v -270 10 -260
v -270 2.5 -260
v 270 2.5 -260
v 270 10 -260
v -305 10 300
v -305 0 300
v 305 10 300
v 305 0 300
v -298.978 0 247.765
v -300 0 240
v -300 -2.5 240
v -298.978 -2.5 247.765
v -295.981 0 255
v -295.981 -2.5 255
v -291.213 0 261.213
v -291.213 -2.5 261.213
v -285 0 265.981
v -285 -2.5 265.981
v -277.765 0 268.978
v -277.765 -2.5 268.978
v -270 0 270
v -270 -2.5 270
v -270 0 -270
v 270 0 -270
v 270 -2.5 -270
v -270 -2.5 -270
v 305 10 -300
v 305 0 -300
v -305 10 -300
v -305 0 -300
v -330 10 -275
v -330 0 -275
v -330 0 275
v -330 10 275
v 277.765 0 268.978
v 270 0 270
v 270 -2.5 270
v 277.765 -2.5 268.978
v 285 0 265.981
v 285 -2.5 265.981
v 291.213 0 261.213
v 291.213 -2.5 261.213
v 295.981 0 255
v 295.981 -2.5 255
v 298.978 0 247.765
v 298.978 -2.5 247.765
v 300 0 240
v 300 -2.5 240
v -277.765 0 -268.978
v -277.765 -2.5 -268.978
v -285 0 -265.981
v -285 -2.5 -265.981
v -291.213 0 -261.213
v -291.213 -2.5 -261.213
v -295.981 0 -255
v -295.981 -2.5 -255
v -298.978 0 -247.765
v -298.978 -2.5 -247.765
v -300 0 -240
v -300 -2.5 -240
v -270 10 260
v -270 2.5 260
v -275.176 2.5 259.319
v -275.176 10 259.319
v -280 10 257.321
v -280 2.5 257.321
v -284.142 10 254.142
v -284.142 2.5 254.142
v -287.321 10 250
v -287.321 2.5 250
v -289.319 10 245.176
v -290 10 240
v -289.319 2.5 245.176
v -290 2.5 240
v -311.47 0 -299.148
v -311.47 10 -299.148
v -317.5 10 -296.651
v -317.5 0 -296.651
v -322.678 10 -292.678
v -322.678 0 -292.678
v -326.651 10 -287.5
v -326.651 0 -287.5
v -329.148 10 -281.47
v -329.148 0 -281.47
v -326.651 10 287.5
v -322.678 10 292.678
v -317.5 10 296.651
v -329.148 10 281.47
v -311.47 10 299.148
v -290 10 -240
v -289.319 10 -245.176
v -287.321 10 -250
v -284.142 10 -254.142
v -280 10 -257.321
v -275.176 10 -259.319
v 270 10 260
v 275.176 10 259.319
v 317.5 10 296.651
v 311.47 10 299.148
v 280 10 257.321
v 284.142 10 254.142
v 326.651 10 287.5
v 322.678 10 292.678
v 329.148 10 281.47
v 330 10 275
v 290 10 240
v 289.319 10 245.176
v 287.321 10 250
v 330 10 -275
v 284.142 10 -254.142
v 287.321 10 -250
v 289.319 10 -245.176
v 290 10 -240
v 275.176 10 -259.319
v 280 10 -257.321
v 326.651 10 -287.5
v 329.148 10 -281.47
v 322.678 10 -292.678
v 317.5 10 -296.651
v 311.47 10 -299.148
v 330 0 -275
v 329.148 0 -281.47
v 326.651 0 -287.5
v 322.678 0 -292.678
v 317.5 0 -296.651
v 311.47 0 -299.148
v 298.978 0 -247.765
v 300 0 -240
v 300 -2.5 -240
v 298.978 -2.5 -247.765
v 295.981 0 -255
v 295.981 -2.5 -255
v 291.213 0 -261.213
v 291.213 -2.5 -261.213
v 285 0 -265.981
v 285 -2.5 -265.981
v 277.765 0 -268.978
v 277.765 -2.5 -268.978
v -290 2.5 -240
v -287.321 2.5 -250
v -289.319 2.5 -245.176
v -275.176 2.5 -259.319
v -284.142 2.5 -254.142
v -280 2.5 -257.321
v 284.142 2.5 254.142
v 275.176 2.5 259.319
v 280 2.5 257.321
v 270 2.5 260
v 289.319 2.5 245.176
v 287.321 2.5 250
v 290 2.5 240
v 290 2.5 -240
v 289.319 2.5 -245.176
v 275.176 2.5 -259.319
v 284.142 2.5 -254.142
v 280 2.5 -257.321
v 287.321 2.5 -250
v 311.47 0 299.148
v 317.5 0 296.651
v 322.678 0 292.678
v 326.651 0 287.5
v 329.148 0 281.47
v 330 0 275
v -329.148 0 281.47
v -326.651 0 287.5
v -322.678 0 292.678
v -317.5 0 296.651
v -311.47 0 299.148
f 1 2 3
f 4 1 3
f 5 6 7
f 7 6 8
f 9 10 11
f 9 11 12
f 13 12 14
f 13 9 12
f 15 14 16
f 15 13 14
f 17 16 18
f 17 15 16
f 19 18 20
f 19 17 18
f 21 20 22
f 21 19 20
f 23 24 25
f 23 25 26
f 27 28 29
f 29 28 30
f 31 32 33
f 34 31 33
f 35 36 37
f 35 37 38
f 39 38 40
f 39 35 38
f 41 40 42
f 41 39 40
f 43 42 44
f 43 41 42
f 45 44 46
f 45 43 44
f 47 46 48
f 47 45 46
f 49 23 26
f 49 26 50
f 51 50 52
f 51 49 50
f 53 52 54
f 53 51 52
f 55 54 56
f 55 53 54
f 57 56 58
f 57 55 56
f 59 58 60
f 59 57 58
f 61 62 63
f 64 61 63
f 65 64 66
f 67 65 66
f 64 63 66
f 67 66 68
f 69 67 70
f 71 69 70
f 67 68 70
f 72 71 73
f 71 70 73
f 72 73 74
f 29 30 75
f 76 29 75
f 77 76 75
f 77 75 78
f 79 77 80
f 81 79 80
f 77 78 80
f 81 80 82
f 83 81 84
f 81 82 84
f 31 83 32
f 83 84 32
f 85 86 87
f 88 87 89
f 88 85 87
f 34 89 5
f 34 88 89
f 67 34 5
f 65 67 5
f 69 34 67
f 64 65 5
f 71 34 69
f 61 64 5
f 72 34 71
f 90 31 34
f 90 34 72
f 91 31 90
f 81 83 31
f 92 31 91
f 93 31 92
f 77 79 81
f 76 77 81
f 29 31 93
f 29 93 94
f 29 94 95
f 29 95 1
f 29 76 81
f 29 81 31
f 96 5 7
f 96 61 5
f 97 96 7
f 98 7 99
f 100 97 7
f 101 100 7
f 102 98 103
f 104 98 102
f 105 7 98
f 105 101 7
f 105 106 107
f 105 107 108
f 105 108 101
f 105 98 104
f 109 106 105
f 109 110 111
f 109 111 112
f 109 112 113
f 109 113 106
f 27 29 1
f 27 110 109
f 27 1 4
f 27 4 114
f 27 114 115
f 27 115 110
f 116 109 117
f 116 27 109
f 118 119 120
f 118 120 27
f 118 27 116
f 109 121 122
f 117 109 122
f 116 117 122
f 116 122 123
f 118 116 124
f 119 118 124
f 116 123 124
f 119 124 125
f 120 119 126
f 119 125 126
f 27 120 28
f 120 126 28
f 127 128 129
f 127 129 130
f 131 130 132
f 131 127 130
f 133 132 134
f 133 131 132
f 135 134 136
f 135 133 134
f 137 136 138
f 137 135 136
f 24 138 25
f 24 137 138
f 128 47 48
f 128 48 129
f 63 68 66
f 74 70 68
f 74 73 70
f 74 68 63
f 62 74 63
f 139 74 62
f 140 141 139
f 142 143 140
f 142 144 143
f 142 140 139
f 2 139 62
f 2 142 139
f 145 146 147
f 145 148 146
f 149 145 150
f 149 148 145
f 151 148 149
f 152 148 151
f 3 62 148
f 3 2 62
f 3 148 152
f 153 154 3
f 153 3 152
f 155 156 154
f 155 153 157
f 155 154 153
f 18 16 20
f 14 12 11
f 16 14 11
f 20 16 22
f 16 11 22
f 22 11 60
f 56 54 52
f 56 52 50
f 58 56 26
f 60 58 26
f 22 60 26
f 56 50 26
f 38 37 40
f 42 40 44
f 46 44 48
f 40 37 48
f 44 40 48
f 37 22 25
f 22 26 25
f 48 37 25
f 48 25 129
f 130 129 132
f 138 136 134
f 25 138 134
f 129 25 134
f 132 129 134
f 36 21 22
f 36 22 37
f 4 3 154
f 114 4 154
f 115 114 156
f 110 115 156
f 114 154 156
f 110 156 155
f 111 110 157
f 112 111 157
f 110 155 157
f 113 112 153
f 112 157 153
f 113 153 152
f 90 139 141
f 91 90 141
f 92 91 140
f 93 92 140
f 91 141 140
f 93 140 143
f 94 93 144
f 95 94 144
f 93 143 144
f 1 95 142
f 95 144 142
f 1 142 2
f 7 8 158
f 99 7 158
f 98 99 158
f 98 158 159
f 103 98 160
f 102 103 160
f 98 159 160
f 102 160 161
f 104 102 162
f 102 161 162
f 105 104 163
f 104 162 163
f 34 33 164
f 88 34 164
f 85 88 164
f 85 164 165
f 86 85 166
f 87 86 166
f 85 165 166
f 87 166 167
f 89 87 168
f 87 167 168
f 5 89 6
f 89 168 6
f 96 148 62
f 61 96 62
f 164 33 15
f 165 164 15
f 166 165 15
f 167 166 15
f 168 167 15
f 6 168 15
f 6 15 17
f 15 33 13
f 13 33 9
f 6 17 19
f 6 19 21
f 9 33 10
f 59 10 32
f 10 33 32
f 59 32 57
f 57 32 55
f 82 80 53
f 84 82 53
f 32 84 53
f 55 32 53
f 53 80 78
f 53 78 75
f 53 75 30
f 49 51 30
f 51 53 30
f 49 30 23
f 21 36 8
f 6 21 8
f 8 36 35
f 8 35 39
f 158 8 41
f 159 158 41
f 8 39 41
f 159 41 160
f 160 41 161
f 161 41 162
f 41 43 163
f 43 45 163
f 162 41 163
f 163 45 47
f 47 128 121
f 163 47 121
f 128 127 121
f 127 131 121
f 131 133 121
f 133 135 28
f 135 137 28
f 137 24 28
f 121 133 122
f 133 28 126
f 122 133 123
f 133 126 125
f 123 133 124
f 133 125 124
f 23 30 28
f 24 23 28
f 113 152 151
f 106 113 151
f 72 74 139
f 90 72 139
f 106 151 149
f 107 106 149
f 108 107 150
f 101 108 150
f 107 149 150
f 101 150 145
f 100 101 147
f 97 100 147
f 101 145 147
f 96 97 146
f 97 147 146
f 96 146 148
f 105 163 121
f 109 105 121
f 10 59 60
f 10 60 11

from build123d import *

# Parameters (mm, degrees)
RESSALTO_EXTRUS_O2_DEPTH = 10
RESSALTO_EXTRUS_O3_DEPTH = 2.5


with BuildPart() as part:
    # Esboço1 → Ressalto-extrusão2 (new body)
    with BuildSketch(Plane(origin=(0, 0, 0), x_dir=(1, 0, 0), z_dir=(0, 1, 0))):
        with BuildLine():
            Line((-305, -300), (305, -300))
            ThreePointArc((305, -300), (322.67766953, -292.67766953), (330, -275))
            Line((330, -275), (330, 275))
            ThreePointArc((330, 275), (322.67766953, 292.67766953), (305, 300))
            Line((305, 300), (-305, 300))
            ThreePointArc((-305, 300), (-322.67766953, 292.67766953), (-330, 275))
            Line((-330, 275), (-330, -275))
            ThreePointArc((-330, -275), (-322.67766953, -292.67766953), (-305, -300))
        make_face()
        with BuildLine():
            Line((270, -260), (-270, -260))
            ThreePointArc((-270, -260), (-284.142135624, -254.142135624), (-290, -240))
            Line((-290, -240), (-290, 240))
            ThreePointArc((-290, 240), (-284.142135624, 254.142135624), (-270, 260))
            Line((-270, 260), (270, 260))
            ThreePointArc((270, 260), (284.142135624, 254.142135624), (290, 240))
            Line((290, 240), (290, -240))
            ThreePointArc((290, -240), (284.142135624, -254.142135624), (270, -260))
        make_face(mode=Mode.SUBTRACT)
    extrude(amount=RESSALTO_EXTRUS_O2_DEPTH)

    # Esboço2 → Ressalto-extrusão3 (add, symmetric)
    with BuildSketch(Plane(origin=(0, 0, 0), x_dir=(1, 0, 0), z_dir=(0, 1, 0))):
        with BuildLine():
            Line((300, -240), (300, 240))
            ThreePointArc((300, 240), (291.213203436, 261.213203436), (270, 270))
            Line((270, 270), (-270, 270))
            ThreePointArc((-270, 270), (-291.213203436, 261.213203436), (-300, 240))
            Line((-300, 240), (-300, -240))
            ThreePointArc((-300, -240), (-291.213203436, -261.213203436), (-270, -270))
            Line((-270, -270), (270, -270))
            ThreePointArc((270, -270), (291.213203436, -261.213203436), (300, -240))
        make_face()
    extrude(amount=RESSALTO_EXTRUS_O3_DEPTH, both=True)


solid = part.part
